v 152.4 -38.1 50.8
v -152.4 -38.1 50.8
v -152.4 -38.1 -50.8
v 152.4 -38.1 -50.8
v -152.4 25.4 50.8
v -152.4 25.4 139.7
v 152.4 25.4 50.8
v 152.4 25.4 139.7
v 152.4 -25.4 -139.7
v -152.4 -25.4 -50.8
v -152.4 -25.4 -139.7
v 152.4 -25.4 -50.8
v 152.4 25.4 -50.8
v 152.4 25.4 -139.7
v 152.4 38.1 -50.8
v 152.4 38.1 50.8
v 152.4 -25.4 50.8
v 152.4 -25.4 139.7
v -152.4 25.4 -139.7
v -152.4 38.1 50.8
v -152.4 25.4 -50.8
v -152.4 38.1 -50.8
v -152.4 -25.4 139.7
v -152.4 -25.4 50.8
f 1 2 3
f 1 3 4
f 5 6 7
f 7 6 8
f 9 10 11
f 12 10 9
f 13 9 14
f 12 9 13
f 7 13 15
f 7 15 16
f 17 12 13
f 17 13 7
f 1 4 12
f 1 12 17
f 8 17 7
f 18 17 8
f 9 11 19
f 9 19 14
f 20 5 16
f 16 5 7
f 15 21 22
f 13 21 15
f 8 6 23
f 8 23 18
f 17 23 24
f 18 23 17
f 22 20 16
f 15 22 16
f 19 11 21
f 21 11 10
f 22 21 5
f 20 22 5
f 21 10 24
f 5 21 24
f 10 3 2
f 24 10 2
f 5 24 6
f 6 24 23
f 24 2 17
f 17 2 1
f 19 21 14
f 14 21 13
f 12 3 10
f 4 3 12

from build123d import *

# Parameters (mm, degrees)
F0_W     = 304.8
F0_H     = 101.6
F1_DEPTH = 38.1
F0_H_2   = 88.9
F2_DEPTH = 25.4


with BuildPart() as f1:
    # F0 (on Front) → F1 (new body, symmetric)
    with BuildSketch(Plane.XZ):
        Rectangle(F0_W, F0_H)
    extrude(amount=F1_DEPTH, both=True)

    # F0 (on Front) → F2 (join, symmetric)
    with BuildSketch(Plane.XZ):
        with Locations((0, 95.25)):
            Rectangle(F0_W, F0_H_2)
        with Locations((0, -95.25)):
            Rectangle(F0_W, F0_H_2)
    extrude(amount=F2_DEPTH, both=True)


solid = f1.part
